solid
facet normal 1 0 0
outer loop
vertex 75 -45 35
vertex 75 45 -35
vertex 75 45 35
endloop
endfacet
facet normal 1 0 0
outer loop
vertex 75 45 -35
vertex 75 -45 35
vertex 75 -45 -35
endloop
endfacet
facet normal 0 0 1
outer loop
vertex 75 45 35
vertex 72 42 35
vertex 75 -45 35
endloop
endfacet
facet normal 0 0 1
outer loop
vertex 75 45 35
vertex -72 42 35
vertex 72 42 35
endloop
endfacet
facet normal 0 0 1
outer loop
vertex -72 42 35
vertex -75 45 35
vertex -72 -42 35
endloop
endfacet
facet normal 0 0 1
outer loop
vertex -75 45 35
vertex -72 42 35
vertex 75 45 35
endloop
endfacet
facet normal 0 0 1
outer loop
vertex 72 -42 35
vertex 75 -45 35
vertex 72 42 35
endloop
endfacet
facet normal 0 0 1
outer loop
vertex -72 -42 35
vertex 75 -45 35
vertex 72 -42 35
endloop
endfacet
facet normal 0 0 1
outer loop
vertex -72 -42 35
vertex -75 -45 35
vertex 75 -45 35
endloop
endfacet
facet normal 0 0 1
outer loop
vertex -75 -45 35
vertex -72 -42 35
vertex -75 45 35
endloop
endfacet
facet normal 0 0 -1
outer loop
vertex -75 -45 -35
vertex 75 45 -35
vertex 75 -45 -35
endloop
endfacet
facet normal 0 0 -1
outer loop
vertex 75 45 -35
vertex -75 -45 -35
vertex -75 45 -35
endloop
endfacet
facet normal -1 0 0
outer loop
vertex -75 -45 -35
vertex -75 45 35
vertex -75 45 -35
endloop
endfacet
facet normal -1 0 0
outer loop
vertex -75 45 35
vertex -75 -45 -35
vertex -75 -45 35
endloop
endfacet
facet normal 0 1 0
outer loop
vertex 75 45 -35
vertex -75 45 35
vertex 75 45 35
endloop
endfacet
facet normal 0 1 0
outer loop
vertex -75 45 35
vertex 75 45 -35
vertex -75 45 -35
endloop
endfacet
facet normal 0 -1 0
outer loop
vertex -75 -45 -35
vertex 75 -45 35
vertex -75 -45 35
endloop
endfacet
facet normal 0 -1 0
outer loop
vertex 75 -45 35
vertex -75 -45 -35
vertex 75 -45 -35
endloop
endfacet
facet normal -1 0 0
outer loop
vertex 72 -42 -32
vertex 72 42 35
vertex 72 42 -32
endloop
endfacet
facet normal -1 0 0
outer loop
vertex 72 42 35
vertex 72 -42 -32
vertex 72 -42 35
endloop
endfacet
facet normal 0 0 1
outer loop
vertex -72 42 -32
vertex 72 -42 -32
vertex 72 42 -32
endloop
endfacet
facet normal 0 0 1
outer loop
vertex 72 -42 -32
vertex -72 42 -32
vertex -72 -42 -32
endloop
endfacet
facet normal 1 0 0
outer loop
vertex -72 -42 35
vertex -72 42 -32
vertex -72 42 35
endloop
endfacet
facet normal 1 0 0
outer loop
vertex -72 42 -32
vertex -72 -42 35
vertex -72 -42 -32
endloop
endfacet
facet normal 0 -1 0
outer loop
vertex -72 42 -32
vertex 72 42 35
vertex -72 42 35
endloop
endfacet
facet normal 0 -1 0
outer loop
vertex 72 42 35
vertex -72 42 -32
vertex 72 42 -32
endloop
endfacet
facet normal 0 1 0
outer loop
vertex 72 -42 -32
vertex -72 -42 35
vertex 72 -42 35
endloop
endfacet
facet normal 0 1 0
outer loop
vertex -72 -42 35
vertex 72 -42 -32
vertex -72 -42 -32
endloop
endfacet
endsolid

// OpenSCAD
// ========================================
// a 150 x 90 x 70 mm enclosure with 3 mm wall thickness
// NeuroCAD canonical IR; dimensions are millimetres
// ========================================
$fn = 48;

difference() {
  cube(size=[150, 90, 70], center=true);
  translate([0, 0, 1.6]) {
    cube(size=[144, 84, 67.2], center=true);
  }
}
